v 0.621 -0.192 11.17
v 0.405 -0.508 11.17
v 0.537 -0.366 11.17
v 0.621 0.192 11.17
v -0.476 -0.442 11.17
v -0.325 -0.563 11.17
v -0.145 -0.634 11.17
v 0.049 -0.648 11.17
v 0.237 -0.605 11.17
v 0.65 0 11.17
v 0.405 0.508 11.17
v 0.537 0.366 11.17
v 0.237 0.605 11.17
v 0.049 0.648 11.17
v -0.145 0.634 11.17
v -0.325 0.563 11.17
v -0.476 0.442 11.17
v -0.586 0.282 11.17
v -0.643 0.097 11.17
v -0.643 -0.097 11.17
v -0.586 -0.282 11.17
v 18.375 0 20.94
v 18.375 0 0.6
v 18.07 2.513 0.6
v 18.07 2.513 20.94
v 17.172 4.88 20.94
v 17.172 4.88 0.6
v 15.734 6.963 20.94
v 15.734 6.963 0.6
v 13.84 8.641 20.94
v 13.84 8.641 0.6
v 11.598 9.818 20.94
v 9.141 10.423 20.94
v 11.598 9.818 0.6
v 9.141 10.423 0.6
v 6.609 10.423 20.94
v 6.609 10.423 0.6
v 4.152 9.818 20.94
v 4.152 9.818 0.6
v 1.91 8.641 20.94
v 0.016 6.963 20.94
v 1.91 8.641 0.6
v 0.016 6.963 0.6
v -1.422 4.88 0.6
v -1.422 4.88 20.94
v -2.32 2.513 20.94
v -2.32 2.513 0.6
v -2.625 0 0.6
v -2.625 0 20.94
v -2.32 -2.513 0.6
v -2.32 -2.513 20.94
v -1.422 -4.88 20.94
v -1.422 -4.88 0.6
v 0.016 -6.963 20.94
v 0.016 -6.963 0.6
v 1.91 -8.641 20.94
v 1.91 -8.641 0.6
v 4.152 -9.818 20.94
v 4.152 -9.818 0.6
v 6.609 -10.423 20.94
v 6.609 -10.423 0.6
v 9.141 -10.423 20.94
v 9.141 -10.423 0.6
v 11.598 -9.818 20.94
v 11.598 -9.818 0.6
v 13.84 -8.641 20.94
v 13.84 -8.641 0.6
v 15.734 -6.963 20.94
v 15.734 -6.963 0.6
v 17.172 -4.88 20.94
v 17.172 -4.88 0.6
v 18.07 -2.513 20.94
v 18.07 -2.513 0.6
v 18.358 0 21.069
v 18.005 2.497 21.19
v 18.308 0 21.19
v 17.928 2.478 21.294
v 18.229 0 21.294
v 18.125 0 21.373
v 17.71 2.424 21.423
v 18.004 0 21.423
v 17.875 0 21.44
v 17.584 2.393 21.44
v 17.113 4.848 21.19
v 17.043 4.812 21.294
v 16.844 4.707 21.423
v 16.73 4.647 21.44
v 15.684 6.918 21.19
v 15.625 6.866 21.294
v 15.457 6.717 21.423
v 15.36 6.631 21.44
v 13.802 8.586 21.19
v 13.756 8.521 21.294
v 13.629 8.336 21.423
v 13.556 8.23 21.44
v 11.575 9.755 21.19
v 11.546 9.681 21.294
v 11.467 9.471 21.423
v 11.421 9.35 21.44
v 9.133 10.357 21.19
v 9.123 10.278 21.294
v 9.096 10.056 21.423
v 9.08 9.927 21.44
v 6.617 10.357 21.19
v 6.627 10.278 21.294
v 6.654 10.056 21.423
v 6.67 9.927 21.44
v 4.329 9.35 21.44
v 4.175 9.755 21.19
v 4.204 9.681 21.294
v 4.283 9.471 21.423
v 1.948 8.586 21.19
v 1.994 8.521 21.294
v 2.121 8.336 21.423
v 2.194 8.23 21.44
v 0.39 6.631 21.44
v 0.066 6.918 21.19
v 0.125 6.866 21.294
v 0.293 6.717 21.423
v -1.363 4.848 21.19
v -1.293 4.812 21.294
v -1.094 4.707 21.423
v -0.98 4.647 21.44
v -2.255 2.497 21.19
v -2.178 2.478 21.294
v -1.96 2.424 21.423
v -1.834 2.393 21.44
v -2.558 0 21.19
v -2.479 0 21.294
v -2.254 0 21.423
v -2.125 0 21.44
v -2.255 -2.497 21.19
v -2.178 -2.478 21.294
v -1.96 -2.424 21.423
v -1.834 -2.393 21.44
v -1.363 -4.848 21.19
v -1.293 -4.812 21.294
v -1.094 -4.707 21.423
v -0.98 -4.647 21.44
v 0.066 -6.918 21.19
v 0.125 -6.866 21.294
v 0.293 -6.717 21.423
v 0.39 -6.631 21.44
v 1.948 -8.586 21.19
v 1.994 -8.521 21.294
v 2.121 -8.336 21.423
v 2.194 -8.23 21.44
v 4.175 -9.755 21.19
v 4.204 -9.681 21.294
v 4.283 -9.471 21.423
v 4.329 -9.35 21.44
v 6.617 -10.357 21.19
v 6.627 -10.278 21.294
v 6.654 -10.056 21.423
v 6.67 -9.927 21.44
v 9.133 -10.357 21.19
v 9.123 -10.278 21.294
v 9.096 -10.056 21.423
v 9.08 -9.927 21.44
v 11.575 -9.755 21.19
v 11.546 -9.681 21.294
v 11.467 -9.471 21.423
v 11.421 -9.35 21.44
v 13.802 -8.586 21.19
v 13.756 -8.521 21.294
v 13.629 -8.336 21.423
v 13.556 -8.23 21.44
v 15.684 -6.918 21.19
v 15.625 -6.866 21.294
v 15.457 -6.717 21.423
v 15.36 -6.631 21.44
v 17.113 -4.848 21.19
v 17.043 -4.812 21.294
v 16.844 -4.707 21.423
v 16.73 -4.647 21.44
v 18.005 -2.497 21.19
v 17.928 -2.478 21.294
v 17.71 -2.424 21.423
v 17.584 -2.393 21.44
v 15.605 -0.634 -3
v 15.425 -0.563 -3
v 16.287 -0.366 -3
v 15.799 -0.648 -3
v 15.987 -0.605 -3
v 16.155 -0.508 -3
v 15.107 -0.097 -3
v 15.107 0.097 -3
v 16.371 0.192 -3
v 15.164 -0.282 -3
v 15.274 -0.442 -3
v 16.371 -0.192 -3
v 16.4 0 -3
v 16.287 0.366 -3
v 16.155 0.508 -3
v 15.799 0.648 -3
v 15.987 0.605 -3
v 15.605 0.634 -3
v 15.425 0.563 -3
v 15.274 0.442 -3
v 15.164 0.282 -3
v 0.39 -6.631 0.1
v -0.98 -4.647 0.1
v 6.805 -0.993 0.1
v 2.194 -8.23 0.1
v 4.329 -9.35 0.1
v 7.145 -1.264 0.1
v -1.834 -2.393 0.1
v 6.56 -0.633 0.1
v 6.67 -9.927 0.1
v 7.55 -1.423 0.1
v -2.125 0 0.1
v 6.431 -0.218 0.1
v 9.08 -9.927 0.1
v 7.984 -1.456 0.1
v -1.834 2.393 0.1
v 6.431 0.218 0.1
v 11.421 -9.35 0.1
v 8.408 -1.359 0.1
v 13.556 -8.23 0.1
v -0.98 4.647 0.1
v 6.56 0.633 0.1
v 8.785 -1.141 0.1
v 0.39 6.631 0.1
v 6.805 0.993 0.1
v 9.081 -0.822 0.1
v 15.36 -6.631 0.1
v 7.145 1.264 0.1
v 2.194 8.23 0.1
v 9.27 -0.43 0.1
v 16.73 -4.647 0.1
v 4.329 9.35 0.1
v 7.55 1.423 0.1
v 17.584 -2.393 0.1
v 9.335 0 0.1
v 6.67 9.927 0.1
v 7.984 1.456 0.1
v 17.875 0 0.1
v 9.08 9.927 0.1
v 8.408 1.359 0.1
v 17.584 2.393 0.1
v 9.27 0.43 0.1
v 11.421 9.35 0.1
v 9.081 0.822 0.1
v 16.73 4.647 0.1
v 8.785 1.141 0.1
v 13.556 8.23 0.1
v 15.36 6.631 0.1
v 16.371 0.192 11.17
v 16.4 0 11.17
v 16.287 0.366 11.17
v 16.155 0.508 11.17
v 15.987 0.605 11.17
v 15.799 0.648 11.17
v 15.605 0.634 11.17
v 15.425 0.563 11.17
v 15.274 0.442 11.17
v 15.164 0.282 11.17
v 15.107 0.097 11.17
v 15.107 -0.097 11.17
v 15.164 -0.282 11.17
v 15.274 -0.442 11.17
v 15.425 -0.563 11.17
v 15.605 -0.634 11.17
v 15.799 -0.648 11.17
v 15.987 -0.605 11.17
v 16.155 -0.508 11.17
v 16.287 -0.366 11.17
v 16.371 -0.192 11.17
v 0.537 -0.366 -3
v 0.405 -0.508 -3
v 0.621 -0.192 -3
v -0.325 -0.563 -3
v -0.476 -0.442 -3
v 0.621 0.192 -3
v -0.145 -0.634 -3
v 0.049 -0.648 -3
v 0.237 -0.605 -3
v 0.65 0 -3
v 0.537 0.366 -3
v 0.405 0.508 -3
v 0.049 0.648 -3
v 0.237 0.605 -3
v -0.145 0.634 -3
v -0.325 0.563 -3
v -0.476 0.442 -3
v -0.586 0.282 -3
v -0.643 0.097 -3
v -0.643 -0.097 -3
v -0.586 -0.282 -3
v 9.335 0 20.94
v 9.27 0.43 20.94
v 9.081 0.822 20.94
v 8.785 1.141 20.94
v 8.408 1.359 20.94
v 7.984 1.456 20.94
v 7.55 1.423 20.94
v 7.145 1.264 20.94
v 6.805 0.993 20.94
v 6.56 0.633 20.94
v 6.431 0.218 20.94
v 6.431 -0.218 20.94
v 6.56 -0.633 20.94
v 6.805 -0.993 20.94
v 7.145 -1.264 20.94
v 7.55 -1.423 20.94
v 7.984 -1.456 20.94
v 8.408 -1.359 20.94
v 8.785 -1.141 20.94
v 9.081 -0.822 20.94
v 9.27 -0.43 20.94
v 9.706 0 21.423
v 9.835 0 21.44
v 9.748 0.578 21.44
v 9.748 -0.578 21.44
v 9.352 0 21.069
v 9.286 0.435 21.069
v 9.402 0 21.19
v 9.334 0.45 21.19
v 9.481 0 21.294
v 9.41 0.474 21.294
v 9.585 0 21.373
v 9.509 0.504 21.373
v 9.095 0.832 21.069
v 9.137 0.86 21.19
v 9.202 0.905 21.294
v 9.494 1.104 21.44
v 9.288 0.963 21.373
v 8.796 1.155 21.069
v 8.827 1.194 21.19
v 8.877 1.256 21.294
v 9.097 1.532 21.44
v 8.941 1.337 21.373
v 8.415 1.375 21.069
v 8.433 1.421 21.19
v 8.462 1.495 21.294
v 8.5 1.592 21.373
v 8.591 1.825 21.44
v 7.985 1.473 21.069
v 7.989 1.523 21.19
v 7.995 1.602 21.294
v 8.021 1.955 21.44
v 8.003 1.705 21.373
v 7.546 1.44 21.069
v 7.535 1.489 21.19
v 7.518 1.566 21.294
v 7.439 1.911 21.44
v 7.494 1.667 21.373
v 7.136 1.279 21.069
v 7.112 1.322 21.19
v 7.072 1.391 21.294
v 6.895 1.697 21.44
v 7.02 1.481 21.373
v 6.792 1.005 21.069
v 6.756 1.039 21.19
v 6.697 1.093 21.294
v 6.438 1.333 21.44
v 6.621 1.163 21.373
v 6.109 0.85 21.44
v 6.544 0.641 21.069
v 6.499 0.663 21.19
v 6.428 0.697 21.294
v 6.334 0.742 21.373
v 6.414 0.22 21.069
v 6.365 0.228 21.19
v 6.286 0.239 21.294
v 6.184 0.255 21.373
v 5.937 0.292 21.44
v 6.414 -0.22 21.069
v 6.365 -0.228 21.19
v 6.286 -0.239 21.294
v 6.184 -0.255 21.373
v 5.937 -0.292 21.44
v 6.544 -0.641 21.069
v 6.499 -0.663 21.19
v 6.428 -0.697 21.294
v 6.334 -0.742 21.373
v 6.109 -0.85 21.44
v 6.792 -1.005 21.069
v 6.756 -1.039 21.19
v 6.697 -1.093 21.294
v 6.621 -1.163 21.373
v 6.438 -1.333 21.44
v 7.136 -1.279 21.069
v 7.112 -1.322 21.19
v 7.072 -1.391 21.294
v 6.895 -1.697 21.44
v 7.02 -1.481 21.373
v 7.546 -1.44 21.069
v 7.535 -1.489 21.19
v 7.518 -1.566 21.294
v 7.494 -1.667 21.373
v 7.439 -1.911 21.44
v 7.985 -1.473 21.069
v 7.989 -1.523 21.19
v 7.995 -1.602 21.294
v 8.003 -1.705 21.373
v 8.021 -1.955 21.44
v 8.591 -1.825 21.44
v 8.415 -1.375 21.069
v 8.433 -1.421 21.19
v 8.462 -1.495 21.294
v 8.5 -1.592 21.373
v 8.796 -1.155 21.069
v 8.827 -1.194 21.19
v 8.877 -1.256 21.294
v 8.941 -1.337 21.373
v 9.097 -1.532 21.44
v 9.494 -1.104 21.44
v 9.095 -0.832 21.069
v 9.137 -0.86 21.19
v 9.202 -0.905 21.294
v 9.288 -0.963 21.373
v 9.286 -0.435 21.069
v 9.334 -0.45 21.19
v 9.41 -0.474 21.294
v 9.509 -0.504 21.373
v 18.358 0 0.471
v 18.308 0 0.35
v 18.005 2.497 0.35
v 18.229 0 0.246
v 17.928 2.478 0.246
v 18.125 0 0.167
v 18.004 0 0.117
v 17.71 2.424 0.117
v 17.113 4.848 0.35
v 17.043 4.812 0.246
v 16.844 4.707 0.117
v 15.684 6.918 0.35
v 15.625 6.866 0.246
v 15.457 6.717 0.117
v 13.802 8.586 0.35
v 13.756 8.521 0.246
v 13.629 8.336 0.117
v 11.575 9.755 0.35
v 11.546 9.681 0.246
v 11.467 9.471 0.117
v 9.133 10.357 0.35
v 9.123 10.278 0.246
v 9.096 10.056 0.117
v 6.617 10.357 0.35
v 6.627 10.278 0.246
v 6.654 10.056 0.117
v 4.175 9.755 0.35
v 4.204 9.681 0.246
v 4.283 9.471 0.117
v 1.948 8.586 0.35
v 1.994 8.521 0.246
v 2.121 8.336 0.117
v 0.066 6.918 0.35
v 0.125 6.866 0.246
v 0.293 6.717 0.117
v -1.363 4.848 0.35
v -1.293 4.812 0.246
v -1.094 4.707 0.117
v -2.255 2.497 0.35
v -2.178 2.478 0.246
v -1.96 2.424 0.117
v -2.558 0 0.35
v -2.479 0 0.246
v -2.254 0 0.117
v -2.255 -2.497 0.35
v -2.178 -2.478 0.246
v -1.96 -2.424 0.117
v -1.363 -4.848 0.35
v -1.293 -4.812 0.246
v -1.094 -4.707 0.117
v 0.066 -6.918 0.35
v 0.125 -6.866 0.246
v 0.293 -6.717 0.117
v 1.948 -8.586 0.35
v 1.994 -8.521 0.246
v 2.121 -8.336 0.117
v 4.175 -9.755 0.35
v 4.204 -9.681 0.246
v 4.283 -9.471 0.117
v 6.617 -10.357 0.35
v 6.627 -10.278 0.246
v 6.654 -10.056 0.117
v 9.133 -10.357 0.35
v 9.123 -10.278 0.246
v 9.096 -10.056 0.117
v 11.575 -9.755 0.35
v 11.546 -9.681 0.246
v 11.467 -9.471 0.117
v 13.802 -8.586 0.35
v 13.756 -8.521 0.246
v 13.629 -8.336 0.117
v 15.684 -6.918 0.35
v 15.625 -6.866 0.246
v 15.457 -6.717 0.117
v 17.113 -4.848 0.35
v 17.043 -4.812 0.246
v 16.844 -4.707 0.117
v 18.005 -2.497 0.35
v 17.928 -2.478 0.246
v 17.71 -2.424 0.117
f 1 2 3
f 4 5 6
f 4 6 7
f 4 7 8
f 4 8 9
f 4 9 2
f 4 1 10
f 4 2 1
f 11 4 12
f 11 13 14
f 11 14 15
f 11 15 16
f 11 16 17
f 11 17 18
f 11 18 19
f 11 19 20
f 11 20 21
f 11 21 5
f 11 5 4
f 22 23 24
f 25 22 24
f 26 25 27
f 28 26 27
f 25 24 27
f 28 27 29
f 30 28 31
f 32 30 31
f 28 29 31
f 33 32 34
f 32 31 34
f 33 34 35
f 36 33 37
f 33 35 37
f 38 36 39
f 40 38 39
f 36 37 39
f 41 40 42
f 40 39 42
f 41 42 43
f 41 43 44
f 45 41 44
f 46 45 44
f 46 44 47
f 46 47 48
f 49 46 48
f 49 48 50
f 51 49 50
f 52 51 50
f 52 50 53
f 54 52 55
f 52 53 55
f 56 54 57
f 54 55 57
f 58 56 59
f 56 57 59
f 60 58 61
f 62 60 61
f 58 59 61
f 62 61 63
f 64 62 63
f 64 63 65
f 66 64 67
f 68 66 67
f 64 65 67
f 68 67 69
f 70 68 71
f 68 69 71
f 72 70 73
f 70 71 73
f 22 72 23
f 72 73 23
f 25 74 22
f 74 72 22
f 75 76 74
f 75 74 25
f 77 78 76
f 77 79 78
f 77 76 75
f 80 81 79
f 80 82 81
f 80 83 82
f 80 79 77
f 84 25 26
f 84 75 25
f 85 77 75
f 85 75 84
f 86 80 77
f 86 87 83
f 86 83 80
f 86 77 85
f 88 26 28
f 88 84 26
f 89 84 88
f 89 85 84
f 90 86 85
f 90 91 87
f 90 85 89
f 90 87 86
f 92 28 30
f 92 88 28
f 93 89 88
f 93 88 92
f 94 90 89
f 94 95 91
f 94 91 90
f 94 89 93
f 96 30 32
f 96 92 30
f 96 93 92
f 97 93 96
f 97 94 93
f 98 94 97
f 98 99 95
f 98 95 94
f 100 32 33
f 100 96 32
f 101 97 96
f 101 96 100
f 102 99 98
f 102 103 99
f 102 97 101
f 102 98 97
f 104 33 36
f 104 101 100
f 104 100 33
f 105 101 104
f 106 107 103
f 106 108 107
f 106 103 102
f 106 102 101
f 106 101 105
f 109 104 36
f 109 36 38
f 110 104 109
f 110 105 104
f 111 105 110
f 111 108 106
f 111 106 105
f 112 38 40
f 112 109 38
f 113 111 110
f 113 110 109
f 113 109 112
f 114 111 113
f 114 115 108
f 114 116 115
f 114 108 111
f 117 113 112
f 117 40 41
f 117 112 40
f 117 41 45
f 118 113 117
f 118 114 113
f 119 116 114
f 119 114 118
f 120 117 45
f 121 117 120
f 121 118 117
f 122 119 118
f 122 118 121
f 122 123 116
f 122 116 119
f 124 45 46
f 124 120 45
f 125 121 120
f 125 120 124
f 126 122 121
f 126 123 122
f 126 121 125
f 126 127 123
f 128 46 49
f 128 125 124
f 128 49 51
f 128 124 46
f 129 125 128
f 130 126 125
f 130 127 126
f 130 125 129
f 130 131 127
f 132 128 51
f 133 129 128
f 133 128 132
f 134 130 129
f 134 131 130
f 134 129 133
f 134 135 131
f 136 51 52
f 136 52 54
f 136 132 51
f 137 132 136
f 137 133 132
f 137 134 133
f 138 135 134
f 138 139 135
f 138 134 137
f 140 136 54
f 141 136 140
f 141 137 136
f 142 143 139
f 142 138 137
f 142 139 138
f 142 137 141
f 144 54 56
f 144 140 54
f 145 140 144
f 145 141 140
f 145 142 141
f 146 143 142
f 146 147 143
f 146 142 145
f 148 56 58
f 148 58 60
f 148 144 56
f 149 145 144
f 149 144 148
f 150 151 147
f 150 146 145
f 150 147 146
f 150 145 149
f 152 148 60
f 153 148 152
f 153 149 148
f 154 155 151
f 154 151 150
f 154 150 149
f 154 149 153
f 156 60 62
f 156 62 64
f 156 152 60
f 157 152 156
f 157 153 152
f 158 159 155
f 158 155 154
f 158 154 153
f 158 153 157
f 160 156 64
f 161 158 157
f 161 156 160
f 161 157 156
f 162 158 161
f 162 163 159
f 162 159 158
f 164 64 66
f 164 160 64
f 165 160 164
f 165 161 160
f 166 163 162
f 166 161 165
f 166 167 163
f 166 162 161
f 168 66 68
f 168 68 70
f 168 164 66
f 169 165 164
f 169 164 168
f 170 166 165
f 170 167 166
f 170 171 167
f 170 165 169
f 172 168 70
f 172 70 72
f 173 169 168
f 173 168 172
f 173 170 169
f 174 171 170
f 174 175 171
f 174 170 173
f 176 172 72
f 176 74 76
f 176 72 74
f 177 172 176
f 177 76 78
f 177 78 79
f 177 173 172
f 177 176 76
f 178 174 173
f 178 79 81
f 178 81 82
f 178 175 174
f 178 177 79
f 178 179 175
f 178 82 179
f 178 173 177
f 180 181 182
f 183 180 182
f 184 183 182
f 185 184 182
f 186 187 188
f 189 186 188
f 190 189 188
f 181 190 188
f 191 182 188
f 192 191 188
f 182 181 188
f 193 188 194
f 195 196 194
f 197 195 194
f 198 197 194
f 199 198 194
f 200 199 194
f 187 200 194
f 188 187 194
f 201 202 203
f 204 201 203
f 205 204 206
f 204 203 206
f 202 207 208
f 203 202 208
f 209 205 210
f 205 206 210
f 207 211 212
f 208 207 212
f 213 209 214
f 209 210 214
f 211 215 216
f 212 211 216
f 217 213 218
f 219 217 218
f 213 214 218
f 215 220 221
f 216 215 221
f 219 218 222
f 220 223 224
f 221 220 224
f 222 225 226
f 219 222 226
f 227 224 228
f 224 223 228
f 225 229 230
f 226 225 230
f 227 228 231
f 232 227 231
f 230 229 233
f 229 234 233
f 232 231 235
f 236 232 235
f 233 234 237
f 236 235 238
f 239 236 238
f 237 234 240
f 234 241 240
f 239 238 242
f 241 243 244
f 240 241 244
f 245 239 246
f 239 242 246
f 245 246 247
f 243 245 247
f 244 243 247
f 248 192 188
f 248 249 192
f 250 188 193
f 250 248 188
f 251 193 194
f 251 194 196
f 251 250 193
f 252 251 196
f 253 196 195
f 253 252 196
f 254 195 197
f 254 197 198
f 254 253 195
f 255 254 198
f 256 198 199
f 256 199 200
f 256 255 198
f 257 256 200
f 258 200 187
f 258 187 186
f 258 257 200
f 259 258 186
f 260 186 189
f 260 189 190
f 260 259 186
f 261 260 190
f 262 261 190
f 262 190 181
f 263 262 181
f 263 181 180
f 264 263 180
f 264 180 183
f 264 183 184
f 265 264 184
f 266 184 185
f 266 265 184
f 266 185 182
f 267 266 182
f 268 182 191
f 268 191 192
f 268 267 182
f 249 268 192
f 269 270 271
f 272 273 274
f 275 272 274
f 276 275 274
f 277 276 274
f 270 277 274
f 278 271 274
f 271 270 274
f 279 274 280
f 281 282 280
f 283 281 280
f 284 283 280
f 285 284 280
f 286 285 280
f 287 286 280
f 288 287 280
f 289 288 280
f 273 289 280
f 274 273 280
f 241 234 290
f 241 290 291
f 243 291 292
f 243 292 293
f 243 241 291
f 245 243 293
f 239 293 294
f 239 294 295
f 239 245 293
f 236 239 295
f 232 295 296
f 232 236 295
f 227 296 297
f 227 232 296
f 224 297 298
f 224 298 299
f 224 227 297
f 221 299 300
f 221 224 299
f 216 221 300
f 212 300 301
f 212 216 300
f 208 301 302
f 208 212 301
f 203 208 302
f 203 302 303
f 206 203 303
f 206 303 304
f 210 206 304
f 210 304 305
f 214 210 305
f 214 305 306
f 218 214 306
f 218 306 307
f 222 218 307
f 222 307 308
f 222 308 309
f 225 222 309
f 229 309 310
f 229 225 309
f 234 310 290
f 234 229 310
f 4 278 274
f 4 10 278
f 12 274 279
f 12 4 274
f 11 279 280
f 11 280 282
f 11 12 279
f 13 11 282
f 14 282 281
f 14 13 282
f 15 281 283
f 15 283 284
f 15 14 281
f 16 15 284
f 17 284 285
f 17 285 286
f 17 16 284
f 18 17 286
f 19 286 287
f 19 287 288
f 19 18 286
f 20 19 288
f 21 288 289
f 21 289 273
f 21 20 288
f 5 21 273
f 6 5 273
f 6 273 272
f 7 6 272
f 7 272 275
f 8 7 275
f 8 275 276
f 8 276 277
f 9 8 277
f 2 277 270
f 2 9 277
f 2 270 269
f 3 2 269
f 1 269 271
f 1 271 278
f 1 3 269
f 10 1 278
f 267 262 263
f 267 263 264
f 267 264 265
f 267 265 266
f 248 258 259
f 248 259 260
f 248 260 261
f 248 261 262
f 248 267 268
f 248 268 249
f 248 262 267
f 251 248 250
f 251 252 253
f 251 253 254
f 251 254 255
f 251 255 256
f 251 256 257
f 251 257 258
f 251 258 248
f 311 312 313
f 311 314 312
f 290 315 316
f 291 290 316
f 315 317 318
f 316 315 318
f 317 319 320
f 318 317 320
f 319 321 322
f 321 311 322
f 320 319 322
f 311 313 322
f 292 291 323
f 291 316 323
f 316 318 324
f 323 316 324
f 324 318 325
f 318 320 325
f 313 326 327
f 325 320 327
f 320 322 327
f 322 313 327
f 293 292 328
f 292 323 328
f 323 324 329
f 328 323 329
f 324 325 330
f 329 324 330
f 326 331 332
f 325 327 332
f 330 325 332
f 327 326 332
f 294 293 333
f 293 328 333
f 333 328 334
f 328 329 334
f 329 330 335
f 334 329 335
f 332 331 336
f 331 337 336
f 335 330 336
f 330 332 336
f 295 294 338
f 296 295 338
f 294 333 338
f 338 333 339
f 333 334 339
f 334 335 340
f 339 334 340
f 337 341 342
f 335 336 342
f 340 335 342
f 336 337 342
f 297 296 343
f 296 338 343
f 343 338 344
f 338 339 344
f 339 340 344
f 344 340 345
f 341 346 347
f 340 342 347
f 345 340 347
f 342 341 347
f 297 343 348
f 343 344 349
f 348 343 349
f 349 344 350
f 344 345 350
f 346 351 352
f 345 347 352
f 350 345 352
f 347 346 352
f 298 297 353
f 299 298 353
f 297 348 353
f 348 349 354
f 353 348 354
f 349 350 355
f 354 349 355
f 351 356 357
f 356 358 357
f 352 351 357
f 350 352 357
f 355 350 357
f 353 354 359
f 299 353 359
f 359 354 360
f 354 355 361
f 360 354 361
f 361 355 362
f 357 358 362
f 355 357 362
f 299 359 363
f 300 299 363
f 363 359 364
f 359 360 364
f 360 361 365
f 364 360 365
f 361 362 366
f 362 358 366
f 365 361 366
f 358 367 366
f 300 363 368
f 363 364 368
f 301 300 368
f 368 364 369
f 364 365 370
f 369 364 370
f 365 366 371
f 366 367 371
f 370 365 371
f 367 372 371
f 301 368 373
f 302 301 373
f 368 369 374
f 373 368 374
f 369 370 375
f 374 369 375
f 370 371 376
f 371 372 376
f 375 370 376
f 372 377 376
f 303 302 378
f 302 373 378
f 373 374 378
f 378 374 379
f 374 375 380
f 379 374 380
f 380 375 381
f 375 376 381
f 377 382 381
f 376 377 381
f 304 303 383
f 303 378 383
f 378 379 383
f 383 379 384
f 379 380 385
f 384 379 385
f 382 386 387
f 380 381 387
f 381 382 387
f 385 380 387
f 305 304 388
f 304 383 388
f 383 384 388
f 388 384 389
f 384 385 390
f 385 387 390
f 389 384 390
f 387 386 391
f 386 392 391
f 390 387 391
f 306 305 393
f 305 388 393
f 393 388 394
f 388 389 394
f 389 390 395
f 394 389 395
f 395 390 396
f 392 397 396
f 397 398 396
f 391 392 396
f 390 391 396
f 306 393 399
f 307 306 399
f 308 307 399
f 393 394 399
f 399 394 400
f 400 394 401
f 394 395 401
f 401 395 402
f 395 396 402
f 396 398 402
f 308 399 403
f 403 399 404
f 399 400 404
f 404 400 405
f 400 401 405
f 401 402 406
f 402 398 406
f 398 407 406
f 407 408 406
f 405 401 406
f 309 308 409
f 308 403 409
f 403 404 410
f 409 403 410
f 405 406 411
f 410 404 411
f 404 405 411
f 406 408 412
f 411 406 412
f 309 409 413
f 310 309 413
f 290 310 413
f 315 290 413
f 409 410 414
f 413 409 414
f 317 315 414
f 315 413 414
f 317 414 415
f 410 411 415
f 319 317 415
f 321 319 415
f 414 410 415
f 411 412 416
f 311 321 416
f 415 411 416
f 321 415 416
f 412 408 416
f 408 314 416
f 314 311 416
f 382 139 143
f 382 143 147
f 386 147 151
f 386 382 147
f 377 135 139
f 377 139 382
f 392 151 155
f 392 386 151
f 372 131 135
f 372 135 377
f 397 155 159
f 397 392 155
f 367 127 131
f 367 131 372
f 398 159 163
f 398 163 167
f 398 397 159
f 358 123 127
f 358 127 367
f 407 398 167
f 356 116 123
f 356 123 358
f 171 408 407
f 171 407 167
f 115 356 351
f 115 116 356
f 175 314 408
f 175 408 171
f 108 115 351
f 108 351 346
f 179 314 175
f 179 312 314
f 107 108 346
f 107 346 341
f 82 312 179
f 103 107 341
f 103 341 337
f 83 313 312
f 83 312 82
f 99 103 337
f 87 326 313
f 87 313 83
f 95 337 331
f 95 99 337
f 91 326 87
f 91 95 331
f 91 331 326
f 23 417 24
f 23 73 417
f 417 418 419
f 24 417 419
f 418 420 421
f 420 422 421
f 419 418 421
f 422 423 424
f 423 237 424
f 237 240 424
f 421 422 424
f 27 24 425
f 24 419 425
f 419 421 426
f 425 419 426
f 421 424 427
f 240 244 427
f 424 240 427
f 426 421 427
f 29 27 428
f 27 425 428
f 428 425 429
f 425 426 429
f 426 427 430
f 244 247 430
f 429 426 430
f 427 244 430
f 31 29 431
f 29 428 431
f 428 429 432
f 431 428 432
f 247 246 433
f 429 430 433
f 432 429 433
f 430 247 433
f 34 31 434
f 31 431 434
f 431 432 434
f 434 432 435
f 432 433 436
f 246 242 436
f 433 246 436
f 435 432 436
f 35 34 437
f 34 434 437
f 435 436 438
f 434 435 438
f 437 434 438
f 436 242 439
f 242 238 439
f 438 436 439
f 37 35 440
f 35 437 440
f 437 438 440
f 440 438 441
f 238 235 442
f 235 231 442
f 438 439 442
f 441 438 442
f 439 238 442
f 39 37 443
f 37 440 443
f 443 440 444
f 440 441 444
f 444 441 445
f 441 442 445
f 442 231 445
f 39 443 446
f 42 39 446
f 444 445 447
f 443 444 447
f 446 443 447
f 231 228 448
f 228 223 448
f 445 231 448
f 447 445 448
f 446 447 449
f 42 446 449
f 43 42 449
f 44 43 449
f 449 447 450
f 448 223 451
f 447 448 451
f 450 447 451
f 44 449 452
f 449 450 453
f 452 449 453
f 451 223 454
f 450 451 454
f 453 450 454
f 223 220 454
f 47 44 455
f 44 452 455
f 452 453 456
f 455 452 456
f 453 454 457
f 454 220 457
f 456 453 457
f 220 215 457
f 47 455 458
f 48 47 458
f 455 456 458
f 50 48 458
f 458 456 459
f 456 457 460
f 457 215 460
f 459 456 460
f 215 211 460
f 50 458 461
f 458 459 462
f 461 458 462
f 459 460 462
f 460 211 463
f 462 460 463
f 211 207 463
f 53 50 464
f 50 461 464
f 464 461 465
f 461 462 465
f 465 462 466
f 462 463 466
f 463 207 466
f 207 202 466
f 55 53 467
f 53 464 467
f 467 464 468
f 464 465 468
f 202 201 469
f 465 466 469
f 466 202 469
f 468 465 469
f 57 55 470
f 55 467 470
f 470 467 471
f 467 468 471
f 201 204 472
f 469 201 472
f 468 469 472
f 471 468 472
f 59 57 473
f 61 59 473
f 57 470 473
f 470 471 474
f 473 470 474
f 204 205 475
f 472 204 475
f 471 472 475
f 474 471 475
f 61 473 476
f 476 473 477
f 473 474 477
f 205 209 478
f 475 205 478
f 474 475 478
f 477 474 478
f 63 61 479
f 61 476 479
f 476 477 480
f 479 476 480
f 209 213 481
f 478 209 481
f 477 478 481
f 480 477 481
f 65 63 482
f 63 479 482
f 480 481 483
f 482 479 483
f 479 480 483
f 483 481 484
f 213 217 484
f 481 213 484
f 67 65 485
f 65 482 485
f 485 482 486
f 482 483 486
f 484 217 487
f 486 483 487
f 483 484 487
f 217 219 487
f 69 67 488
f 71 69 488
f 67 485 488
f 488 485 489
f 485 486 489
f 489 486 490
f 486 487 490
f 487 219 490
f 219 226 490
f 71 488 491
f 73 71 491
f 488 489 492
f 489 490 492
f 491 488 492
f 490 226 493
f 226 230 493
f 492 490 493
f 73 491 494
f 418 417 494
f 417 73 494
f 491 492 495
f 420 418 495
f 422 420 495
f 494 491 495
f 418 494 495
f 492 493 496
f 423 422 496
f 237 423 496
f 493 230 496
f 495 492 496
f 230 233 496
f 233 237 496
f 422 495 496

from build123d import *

# Parameters (mm, degrees)
SKETCH001_R       = 0.65
PAD001_DEPTH      = 10.67
PAD001_DEPTH_BACK = 3.5
SKETCH_R          = 10.5
SKETCH_R_2        = 1.46
PAD_DEPTH         = 21.34
FILLET_R          = 0.5


with BuildPart() as pad001:
    # Sketch001 → Pad001 (new body, two sides)
    with BuildSketch(Plane.XY.offset(0.5)) as pad001_sk:
        Circle(SKETCH001_R)
        with Locations((15.75, 0)):
            Circle(SKETCH001_R)
    extrude(amount=PAD001_DEPTH)
    extrude(pad001_sk.sketch, amount=-PAD001_DEPTH_BACK)


with BuildPart() as fillet_body:
    # Sketch → Pad (new body)
    with BuildSketch(Plane.XY.offset(0.1)):
        with Locations((7.875, 0)):
            Circle(SKETCH_R)
        with Locations((7.875, 0)):
            Circle(SKETCH_R_2, mode=Mode.SUBTRACT)
    extrude(amount=PAD_DEPTH)

    # Fillet
    fillet_edges = [fillet_body.edges().sort_by_distance(p)[0] for p in [
        (6.415, 0, 21.44),
        (-2.625, 0, 21.44),
        (-2.625, 0, 0.1),
    ]]
    fillet(fillet_edges, radius=FILLET_R)


solid = Compound([pad001.part, fillet_body.part])
